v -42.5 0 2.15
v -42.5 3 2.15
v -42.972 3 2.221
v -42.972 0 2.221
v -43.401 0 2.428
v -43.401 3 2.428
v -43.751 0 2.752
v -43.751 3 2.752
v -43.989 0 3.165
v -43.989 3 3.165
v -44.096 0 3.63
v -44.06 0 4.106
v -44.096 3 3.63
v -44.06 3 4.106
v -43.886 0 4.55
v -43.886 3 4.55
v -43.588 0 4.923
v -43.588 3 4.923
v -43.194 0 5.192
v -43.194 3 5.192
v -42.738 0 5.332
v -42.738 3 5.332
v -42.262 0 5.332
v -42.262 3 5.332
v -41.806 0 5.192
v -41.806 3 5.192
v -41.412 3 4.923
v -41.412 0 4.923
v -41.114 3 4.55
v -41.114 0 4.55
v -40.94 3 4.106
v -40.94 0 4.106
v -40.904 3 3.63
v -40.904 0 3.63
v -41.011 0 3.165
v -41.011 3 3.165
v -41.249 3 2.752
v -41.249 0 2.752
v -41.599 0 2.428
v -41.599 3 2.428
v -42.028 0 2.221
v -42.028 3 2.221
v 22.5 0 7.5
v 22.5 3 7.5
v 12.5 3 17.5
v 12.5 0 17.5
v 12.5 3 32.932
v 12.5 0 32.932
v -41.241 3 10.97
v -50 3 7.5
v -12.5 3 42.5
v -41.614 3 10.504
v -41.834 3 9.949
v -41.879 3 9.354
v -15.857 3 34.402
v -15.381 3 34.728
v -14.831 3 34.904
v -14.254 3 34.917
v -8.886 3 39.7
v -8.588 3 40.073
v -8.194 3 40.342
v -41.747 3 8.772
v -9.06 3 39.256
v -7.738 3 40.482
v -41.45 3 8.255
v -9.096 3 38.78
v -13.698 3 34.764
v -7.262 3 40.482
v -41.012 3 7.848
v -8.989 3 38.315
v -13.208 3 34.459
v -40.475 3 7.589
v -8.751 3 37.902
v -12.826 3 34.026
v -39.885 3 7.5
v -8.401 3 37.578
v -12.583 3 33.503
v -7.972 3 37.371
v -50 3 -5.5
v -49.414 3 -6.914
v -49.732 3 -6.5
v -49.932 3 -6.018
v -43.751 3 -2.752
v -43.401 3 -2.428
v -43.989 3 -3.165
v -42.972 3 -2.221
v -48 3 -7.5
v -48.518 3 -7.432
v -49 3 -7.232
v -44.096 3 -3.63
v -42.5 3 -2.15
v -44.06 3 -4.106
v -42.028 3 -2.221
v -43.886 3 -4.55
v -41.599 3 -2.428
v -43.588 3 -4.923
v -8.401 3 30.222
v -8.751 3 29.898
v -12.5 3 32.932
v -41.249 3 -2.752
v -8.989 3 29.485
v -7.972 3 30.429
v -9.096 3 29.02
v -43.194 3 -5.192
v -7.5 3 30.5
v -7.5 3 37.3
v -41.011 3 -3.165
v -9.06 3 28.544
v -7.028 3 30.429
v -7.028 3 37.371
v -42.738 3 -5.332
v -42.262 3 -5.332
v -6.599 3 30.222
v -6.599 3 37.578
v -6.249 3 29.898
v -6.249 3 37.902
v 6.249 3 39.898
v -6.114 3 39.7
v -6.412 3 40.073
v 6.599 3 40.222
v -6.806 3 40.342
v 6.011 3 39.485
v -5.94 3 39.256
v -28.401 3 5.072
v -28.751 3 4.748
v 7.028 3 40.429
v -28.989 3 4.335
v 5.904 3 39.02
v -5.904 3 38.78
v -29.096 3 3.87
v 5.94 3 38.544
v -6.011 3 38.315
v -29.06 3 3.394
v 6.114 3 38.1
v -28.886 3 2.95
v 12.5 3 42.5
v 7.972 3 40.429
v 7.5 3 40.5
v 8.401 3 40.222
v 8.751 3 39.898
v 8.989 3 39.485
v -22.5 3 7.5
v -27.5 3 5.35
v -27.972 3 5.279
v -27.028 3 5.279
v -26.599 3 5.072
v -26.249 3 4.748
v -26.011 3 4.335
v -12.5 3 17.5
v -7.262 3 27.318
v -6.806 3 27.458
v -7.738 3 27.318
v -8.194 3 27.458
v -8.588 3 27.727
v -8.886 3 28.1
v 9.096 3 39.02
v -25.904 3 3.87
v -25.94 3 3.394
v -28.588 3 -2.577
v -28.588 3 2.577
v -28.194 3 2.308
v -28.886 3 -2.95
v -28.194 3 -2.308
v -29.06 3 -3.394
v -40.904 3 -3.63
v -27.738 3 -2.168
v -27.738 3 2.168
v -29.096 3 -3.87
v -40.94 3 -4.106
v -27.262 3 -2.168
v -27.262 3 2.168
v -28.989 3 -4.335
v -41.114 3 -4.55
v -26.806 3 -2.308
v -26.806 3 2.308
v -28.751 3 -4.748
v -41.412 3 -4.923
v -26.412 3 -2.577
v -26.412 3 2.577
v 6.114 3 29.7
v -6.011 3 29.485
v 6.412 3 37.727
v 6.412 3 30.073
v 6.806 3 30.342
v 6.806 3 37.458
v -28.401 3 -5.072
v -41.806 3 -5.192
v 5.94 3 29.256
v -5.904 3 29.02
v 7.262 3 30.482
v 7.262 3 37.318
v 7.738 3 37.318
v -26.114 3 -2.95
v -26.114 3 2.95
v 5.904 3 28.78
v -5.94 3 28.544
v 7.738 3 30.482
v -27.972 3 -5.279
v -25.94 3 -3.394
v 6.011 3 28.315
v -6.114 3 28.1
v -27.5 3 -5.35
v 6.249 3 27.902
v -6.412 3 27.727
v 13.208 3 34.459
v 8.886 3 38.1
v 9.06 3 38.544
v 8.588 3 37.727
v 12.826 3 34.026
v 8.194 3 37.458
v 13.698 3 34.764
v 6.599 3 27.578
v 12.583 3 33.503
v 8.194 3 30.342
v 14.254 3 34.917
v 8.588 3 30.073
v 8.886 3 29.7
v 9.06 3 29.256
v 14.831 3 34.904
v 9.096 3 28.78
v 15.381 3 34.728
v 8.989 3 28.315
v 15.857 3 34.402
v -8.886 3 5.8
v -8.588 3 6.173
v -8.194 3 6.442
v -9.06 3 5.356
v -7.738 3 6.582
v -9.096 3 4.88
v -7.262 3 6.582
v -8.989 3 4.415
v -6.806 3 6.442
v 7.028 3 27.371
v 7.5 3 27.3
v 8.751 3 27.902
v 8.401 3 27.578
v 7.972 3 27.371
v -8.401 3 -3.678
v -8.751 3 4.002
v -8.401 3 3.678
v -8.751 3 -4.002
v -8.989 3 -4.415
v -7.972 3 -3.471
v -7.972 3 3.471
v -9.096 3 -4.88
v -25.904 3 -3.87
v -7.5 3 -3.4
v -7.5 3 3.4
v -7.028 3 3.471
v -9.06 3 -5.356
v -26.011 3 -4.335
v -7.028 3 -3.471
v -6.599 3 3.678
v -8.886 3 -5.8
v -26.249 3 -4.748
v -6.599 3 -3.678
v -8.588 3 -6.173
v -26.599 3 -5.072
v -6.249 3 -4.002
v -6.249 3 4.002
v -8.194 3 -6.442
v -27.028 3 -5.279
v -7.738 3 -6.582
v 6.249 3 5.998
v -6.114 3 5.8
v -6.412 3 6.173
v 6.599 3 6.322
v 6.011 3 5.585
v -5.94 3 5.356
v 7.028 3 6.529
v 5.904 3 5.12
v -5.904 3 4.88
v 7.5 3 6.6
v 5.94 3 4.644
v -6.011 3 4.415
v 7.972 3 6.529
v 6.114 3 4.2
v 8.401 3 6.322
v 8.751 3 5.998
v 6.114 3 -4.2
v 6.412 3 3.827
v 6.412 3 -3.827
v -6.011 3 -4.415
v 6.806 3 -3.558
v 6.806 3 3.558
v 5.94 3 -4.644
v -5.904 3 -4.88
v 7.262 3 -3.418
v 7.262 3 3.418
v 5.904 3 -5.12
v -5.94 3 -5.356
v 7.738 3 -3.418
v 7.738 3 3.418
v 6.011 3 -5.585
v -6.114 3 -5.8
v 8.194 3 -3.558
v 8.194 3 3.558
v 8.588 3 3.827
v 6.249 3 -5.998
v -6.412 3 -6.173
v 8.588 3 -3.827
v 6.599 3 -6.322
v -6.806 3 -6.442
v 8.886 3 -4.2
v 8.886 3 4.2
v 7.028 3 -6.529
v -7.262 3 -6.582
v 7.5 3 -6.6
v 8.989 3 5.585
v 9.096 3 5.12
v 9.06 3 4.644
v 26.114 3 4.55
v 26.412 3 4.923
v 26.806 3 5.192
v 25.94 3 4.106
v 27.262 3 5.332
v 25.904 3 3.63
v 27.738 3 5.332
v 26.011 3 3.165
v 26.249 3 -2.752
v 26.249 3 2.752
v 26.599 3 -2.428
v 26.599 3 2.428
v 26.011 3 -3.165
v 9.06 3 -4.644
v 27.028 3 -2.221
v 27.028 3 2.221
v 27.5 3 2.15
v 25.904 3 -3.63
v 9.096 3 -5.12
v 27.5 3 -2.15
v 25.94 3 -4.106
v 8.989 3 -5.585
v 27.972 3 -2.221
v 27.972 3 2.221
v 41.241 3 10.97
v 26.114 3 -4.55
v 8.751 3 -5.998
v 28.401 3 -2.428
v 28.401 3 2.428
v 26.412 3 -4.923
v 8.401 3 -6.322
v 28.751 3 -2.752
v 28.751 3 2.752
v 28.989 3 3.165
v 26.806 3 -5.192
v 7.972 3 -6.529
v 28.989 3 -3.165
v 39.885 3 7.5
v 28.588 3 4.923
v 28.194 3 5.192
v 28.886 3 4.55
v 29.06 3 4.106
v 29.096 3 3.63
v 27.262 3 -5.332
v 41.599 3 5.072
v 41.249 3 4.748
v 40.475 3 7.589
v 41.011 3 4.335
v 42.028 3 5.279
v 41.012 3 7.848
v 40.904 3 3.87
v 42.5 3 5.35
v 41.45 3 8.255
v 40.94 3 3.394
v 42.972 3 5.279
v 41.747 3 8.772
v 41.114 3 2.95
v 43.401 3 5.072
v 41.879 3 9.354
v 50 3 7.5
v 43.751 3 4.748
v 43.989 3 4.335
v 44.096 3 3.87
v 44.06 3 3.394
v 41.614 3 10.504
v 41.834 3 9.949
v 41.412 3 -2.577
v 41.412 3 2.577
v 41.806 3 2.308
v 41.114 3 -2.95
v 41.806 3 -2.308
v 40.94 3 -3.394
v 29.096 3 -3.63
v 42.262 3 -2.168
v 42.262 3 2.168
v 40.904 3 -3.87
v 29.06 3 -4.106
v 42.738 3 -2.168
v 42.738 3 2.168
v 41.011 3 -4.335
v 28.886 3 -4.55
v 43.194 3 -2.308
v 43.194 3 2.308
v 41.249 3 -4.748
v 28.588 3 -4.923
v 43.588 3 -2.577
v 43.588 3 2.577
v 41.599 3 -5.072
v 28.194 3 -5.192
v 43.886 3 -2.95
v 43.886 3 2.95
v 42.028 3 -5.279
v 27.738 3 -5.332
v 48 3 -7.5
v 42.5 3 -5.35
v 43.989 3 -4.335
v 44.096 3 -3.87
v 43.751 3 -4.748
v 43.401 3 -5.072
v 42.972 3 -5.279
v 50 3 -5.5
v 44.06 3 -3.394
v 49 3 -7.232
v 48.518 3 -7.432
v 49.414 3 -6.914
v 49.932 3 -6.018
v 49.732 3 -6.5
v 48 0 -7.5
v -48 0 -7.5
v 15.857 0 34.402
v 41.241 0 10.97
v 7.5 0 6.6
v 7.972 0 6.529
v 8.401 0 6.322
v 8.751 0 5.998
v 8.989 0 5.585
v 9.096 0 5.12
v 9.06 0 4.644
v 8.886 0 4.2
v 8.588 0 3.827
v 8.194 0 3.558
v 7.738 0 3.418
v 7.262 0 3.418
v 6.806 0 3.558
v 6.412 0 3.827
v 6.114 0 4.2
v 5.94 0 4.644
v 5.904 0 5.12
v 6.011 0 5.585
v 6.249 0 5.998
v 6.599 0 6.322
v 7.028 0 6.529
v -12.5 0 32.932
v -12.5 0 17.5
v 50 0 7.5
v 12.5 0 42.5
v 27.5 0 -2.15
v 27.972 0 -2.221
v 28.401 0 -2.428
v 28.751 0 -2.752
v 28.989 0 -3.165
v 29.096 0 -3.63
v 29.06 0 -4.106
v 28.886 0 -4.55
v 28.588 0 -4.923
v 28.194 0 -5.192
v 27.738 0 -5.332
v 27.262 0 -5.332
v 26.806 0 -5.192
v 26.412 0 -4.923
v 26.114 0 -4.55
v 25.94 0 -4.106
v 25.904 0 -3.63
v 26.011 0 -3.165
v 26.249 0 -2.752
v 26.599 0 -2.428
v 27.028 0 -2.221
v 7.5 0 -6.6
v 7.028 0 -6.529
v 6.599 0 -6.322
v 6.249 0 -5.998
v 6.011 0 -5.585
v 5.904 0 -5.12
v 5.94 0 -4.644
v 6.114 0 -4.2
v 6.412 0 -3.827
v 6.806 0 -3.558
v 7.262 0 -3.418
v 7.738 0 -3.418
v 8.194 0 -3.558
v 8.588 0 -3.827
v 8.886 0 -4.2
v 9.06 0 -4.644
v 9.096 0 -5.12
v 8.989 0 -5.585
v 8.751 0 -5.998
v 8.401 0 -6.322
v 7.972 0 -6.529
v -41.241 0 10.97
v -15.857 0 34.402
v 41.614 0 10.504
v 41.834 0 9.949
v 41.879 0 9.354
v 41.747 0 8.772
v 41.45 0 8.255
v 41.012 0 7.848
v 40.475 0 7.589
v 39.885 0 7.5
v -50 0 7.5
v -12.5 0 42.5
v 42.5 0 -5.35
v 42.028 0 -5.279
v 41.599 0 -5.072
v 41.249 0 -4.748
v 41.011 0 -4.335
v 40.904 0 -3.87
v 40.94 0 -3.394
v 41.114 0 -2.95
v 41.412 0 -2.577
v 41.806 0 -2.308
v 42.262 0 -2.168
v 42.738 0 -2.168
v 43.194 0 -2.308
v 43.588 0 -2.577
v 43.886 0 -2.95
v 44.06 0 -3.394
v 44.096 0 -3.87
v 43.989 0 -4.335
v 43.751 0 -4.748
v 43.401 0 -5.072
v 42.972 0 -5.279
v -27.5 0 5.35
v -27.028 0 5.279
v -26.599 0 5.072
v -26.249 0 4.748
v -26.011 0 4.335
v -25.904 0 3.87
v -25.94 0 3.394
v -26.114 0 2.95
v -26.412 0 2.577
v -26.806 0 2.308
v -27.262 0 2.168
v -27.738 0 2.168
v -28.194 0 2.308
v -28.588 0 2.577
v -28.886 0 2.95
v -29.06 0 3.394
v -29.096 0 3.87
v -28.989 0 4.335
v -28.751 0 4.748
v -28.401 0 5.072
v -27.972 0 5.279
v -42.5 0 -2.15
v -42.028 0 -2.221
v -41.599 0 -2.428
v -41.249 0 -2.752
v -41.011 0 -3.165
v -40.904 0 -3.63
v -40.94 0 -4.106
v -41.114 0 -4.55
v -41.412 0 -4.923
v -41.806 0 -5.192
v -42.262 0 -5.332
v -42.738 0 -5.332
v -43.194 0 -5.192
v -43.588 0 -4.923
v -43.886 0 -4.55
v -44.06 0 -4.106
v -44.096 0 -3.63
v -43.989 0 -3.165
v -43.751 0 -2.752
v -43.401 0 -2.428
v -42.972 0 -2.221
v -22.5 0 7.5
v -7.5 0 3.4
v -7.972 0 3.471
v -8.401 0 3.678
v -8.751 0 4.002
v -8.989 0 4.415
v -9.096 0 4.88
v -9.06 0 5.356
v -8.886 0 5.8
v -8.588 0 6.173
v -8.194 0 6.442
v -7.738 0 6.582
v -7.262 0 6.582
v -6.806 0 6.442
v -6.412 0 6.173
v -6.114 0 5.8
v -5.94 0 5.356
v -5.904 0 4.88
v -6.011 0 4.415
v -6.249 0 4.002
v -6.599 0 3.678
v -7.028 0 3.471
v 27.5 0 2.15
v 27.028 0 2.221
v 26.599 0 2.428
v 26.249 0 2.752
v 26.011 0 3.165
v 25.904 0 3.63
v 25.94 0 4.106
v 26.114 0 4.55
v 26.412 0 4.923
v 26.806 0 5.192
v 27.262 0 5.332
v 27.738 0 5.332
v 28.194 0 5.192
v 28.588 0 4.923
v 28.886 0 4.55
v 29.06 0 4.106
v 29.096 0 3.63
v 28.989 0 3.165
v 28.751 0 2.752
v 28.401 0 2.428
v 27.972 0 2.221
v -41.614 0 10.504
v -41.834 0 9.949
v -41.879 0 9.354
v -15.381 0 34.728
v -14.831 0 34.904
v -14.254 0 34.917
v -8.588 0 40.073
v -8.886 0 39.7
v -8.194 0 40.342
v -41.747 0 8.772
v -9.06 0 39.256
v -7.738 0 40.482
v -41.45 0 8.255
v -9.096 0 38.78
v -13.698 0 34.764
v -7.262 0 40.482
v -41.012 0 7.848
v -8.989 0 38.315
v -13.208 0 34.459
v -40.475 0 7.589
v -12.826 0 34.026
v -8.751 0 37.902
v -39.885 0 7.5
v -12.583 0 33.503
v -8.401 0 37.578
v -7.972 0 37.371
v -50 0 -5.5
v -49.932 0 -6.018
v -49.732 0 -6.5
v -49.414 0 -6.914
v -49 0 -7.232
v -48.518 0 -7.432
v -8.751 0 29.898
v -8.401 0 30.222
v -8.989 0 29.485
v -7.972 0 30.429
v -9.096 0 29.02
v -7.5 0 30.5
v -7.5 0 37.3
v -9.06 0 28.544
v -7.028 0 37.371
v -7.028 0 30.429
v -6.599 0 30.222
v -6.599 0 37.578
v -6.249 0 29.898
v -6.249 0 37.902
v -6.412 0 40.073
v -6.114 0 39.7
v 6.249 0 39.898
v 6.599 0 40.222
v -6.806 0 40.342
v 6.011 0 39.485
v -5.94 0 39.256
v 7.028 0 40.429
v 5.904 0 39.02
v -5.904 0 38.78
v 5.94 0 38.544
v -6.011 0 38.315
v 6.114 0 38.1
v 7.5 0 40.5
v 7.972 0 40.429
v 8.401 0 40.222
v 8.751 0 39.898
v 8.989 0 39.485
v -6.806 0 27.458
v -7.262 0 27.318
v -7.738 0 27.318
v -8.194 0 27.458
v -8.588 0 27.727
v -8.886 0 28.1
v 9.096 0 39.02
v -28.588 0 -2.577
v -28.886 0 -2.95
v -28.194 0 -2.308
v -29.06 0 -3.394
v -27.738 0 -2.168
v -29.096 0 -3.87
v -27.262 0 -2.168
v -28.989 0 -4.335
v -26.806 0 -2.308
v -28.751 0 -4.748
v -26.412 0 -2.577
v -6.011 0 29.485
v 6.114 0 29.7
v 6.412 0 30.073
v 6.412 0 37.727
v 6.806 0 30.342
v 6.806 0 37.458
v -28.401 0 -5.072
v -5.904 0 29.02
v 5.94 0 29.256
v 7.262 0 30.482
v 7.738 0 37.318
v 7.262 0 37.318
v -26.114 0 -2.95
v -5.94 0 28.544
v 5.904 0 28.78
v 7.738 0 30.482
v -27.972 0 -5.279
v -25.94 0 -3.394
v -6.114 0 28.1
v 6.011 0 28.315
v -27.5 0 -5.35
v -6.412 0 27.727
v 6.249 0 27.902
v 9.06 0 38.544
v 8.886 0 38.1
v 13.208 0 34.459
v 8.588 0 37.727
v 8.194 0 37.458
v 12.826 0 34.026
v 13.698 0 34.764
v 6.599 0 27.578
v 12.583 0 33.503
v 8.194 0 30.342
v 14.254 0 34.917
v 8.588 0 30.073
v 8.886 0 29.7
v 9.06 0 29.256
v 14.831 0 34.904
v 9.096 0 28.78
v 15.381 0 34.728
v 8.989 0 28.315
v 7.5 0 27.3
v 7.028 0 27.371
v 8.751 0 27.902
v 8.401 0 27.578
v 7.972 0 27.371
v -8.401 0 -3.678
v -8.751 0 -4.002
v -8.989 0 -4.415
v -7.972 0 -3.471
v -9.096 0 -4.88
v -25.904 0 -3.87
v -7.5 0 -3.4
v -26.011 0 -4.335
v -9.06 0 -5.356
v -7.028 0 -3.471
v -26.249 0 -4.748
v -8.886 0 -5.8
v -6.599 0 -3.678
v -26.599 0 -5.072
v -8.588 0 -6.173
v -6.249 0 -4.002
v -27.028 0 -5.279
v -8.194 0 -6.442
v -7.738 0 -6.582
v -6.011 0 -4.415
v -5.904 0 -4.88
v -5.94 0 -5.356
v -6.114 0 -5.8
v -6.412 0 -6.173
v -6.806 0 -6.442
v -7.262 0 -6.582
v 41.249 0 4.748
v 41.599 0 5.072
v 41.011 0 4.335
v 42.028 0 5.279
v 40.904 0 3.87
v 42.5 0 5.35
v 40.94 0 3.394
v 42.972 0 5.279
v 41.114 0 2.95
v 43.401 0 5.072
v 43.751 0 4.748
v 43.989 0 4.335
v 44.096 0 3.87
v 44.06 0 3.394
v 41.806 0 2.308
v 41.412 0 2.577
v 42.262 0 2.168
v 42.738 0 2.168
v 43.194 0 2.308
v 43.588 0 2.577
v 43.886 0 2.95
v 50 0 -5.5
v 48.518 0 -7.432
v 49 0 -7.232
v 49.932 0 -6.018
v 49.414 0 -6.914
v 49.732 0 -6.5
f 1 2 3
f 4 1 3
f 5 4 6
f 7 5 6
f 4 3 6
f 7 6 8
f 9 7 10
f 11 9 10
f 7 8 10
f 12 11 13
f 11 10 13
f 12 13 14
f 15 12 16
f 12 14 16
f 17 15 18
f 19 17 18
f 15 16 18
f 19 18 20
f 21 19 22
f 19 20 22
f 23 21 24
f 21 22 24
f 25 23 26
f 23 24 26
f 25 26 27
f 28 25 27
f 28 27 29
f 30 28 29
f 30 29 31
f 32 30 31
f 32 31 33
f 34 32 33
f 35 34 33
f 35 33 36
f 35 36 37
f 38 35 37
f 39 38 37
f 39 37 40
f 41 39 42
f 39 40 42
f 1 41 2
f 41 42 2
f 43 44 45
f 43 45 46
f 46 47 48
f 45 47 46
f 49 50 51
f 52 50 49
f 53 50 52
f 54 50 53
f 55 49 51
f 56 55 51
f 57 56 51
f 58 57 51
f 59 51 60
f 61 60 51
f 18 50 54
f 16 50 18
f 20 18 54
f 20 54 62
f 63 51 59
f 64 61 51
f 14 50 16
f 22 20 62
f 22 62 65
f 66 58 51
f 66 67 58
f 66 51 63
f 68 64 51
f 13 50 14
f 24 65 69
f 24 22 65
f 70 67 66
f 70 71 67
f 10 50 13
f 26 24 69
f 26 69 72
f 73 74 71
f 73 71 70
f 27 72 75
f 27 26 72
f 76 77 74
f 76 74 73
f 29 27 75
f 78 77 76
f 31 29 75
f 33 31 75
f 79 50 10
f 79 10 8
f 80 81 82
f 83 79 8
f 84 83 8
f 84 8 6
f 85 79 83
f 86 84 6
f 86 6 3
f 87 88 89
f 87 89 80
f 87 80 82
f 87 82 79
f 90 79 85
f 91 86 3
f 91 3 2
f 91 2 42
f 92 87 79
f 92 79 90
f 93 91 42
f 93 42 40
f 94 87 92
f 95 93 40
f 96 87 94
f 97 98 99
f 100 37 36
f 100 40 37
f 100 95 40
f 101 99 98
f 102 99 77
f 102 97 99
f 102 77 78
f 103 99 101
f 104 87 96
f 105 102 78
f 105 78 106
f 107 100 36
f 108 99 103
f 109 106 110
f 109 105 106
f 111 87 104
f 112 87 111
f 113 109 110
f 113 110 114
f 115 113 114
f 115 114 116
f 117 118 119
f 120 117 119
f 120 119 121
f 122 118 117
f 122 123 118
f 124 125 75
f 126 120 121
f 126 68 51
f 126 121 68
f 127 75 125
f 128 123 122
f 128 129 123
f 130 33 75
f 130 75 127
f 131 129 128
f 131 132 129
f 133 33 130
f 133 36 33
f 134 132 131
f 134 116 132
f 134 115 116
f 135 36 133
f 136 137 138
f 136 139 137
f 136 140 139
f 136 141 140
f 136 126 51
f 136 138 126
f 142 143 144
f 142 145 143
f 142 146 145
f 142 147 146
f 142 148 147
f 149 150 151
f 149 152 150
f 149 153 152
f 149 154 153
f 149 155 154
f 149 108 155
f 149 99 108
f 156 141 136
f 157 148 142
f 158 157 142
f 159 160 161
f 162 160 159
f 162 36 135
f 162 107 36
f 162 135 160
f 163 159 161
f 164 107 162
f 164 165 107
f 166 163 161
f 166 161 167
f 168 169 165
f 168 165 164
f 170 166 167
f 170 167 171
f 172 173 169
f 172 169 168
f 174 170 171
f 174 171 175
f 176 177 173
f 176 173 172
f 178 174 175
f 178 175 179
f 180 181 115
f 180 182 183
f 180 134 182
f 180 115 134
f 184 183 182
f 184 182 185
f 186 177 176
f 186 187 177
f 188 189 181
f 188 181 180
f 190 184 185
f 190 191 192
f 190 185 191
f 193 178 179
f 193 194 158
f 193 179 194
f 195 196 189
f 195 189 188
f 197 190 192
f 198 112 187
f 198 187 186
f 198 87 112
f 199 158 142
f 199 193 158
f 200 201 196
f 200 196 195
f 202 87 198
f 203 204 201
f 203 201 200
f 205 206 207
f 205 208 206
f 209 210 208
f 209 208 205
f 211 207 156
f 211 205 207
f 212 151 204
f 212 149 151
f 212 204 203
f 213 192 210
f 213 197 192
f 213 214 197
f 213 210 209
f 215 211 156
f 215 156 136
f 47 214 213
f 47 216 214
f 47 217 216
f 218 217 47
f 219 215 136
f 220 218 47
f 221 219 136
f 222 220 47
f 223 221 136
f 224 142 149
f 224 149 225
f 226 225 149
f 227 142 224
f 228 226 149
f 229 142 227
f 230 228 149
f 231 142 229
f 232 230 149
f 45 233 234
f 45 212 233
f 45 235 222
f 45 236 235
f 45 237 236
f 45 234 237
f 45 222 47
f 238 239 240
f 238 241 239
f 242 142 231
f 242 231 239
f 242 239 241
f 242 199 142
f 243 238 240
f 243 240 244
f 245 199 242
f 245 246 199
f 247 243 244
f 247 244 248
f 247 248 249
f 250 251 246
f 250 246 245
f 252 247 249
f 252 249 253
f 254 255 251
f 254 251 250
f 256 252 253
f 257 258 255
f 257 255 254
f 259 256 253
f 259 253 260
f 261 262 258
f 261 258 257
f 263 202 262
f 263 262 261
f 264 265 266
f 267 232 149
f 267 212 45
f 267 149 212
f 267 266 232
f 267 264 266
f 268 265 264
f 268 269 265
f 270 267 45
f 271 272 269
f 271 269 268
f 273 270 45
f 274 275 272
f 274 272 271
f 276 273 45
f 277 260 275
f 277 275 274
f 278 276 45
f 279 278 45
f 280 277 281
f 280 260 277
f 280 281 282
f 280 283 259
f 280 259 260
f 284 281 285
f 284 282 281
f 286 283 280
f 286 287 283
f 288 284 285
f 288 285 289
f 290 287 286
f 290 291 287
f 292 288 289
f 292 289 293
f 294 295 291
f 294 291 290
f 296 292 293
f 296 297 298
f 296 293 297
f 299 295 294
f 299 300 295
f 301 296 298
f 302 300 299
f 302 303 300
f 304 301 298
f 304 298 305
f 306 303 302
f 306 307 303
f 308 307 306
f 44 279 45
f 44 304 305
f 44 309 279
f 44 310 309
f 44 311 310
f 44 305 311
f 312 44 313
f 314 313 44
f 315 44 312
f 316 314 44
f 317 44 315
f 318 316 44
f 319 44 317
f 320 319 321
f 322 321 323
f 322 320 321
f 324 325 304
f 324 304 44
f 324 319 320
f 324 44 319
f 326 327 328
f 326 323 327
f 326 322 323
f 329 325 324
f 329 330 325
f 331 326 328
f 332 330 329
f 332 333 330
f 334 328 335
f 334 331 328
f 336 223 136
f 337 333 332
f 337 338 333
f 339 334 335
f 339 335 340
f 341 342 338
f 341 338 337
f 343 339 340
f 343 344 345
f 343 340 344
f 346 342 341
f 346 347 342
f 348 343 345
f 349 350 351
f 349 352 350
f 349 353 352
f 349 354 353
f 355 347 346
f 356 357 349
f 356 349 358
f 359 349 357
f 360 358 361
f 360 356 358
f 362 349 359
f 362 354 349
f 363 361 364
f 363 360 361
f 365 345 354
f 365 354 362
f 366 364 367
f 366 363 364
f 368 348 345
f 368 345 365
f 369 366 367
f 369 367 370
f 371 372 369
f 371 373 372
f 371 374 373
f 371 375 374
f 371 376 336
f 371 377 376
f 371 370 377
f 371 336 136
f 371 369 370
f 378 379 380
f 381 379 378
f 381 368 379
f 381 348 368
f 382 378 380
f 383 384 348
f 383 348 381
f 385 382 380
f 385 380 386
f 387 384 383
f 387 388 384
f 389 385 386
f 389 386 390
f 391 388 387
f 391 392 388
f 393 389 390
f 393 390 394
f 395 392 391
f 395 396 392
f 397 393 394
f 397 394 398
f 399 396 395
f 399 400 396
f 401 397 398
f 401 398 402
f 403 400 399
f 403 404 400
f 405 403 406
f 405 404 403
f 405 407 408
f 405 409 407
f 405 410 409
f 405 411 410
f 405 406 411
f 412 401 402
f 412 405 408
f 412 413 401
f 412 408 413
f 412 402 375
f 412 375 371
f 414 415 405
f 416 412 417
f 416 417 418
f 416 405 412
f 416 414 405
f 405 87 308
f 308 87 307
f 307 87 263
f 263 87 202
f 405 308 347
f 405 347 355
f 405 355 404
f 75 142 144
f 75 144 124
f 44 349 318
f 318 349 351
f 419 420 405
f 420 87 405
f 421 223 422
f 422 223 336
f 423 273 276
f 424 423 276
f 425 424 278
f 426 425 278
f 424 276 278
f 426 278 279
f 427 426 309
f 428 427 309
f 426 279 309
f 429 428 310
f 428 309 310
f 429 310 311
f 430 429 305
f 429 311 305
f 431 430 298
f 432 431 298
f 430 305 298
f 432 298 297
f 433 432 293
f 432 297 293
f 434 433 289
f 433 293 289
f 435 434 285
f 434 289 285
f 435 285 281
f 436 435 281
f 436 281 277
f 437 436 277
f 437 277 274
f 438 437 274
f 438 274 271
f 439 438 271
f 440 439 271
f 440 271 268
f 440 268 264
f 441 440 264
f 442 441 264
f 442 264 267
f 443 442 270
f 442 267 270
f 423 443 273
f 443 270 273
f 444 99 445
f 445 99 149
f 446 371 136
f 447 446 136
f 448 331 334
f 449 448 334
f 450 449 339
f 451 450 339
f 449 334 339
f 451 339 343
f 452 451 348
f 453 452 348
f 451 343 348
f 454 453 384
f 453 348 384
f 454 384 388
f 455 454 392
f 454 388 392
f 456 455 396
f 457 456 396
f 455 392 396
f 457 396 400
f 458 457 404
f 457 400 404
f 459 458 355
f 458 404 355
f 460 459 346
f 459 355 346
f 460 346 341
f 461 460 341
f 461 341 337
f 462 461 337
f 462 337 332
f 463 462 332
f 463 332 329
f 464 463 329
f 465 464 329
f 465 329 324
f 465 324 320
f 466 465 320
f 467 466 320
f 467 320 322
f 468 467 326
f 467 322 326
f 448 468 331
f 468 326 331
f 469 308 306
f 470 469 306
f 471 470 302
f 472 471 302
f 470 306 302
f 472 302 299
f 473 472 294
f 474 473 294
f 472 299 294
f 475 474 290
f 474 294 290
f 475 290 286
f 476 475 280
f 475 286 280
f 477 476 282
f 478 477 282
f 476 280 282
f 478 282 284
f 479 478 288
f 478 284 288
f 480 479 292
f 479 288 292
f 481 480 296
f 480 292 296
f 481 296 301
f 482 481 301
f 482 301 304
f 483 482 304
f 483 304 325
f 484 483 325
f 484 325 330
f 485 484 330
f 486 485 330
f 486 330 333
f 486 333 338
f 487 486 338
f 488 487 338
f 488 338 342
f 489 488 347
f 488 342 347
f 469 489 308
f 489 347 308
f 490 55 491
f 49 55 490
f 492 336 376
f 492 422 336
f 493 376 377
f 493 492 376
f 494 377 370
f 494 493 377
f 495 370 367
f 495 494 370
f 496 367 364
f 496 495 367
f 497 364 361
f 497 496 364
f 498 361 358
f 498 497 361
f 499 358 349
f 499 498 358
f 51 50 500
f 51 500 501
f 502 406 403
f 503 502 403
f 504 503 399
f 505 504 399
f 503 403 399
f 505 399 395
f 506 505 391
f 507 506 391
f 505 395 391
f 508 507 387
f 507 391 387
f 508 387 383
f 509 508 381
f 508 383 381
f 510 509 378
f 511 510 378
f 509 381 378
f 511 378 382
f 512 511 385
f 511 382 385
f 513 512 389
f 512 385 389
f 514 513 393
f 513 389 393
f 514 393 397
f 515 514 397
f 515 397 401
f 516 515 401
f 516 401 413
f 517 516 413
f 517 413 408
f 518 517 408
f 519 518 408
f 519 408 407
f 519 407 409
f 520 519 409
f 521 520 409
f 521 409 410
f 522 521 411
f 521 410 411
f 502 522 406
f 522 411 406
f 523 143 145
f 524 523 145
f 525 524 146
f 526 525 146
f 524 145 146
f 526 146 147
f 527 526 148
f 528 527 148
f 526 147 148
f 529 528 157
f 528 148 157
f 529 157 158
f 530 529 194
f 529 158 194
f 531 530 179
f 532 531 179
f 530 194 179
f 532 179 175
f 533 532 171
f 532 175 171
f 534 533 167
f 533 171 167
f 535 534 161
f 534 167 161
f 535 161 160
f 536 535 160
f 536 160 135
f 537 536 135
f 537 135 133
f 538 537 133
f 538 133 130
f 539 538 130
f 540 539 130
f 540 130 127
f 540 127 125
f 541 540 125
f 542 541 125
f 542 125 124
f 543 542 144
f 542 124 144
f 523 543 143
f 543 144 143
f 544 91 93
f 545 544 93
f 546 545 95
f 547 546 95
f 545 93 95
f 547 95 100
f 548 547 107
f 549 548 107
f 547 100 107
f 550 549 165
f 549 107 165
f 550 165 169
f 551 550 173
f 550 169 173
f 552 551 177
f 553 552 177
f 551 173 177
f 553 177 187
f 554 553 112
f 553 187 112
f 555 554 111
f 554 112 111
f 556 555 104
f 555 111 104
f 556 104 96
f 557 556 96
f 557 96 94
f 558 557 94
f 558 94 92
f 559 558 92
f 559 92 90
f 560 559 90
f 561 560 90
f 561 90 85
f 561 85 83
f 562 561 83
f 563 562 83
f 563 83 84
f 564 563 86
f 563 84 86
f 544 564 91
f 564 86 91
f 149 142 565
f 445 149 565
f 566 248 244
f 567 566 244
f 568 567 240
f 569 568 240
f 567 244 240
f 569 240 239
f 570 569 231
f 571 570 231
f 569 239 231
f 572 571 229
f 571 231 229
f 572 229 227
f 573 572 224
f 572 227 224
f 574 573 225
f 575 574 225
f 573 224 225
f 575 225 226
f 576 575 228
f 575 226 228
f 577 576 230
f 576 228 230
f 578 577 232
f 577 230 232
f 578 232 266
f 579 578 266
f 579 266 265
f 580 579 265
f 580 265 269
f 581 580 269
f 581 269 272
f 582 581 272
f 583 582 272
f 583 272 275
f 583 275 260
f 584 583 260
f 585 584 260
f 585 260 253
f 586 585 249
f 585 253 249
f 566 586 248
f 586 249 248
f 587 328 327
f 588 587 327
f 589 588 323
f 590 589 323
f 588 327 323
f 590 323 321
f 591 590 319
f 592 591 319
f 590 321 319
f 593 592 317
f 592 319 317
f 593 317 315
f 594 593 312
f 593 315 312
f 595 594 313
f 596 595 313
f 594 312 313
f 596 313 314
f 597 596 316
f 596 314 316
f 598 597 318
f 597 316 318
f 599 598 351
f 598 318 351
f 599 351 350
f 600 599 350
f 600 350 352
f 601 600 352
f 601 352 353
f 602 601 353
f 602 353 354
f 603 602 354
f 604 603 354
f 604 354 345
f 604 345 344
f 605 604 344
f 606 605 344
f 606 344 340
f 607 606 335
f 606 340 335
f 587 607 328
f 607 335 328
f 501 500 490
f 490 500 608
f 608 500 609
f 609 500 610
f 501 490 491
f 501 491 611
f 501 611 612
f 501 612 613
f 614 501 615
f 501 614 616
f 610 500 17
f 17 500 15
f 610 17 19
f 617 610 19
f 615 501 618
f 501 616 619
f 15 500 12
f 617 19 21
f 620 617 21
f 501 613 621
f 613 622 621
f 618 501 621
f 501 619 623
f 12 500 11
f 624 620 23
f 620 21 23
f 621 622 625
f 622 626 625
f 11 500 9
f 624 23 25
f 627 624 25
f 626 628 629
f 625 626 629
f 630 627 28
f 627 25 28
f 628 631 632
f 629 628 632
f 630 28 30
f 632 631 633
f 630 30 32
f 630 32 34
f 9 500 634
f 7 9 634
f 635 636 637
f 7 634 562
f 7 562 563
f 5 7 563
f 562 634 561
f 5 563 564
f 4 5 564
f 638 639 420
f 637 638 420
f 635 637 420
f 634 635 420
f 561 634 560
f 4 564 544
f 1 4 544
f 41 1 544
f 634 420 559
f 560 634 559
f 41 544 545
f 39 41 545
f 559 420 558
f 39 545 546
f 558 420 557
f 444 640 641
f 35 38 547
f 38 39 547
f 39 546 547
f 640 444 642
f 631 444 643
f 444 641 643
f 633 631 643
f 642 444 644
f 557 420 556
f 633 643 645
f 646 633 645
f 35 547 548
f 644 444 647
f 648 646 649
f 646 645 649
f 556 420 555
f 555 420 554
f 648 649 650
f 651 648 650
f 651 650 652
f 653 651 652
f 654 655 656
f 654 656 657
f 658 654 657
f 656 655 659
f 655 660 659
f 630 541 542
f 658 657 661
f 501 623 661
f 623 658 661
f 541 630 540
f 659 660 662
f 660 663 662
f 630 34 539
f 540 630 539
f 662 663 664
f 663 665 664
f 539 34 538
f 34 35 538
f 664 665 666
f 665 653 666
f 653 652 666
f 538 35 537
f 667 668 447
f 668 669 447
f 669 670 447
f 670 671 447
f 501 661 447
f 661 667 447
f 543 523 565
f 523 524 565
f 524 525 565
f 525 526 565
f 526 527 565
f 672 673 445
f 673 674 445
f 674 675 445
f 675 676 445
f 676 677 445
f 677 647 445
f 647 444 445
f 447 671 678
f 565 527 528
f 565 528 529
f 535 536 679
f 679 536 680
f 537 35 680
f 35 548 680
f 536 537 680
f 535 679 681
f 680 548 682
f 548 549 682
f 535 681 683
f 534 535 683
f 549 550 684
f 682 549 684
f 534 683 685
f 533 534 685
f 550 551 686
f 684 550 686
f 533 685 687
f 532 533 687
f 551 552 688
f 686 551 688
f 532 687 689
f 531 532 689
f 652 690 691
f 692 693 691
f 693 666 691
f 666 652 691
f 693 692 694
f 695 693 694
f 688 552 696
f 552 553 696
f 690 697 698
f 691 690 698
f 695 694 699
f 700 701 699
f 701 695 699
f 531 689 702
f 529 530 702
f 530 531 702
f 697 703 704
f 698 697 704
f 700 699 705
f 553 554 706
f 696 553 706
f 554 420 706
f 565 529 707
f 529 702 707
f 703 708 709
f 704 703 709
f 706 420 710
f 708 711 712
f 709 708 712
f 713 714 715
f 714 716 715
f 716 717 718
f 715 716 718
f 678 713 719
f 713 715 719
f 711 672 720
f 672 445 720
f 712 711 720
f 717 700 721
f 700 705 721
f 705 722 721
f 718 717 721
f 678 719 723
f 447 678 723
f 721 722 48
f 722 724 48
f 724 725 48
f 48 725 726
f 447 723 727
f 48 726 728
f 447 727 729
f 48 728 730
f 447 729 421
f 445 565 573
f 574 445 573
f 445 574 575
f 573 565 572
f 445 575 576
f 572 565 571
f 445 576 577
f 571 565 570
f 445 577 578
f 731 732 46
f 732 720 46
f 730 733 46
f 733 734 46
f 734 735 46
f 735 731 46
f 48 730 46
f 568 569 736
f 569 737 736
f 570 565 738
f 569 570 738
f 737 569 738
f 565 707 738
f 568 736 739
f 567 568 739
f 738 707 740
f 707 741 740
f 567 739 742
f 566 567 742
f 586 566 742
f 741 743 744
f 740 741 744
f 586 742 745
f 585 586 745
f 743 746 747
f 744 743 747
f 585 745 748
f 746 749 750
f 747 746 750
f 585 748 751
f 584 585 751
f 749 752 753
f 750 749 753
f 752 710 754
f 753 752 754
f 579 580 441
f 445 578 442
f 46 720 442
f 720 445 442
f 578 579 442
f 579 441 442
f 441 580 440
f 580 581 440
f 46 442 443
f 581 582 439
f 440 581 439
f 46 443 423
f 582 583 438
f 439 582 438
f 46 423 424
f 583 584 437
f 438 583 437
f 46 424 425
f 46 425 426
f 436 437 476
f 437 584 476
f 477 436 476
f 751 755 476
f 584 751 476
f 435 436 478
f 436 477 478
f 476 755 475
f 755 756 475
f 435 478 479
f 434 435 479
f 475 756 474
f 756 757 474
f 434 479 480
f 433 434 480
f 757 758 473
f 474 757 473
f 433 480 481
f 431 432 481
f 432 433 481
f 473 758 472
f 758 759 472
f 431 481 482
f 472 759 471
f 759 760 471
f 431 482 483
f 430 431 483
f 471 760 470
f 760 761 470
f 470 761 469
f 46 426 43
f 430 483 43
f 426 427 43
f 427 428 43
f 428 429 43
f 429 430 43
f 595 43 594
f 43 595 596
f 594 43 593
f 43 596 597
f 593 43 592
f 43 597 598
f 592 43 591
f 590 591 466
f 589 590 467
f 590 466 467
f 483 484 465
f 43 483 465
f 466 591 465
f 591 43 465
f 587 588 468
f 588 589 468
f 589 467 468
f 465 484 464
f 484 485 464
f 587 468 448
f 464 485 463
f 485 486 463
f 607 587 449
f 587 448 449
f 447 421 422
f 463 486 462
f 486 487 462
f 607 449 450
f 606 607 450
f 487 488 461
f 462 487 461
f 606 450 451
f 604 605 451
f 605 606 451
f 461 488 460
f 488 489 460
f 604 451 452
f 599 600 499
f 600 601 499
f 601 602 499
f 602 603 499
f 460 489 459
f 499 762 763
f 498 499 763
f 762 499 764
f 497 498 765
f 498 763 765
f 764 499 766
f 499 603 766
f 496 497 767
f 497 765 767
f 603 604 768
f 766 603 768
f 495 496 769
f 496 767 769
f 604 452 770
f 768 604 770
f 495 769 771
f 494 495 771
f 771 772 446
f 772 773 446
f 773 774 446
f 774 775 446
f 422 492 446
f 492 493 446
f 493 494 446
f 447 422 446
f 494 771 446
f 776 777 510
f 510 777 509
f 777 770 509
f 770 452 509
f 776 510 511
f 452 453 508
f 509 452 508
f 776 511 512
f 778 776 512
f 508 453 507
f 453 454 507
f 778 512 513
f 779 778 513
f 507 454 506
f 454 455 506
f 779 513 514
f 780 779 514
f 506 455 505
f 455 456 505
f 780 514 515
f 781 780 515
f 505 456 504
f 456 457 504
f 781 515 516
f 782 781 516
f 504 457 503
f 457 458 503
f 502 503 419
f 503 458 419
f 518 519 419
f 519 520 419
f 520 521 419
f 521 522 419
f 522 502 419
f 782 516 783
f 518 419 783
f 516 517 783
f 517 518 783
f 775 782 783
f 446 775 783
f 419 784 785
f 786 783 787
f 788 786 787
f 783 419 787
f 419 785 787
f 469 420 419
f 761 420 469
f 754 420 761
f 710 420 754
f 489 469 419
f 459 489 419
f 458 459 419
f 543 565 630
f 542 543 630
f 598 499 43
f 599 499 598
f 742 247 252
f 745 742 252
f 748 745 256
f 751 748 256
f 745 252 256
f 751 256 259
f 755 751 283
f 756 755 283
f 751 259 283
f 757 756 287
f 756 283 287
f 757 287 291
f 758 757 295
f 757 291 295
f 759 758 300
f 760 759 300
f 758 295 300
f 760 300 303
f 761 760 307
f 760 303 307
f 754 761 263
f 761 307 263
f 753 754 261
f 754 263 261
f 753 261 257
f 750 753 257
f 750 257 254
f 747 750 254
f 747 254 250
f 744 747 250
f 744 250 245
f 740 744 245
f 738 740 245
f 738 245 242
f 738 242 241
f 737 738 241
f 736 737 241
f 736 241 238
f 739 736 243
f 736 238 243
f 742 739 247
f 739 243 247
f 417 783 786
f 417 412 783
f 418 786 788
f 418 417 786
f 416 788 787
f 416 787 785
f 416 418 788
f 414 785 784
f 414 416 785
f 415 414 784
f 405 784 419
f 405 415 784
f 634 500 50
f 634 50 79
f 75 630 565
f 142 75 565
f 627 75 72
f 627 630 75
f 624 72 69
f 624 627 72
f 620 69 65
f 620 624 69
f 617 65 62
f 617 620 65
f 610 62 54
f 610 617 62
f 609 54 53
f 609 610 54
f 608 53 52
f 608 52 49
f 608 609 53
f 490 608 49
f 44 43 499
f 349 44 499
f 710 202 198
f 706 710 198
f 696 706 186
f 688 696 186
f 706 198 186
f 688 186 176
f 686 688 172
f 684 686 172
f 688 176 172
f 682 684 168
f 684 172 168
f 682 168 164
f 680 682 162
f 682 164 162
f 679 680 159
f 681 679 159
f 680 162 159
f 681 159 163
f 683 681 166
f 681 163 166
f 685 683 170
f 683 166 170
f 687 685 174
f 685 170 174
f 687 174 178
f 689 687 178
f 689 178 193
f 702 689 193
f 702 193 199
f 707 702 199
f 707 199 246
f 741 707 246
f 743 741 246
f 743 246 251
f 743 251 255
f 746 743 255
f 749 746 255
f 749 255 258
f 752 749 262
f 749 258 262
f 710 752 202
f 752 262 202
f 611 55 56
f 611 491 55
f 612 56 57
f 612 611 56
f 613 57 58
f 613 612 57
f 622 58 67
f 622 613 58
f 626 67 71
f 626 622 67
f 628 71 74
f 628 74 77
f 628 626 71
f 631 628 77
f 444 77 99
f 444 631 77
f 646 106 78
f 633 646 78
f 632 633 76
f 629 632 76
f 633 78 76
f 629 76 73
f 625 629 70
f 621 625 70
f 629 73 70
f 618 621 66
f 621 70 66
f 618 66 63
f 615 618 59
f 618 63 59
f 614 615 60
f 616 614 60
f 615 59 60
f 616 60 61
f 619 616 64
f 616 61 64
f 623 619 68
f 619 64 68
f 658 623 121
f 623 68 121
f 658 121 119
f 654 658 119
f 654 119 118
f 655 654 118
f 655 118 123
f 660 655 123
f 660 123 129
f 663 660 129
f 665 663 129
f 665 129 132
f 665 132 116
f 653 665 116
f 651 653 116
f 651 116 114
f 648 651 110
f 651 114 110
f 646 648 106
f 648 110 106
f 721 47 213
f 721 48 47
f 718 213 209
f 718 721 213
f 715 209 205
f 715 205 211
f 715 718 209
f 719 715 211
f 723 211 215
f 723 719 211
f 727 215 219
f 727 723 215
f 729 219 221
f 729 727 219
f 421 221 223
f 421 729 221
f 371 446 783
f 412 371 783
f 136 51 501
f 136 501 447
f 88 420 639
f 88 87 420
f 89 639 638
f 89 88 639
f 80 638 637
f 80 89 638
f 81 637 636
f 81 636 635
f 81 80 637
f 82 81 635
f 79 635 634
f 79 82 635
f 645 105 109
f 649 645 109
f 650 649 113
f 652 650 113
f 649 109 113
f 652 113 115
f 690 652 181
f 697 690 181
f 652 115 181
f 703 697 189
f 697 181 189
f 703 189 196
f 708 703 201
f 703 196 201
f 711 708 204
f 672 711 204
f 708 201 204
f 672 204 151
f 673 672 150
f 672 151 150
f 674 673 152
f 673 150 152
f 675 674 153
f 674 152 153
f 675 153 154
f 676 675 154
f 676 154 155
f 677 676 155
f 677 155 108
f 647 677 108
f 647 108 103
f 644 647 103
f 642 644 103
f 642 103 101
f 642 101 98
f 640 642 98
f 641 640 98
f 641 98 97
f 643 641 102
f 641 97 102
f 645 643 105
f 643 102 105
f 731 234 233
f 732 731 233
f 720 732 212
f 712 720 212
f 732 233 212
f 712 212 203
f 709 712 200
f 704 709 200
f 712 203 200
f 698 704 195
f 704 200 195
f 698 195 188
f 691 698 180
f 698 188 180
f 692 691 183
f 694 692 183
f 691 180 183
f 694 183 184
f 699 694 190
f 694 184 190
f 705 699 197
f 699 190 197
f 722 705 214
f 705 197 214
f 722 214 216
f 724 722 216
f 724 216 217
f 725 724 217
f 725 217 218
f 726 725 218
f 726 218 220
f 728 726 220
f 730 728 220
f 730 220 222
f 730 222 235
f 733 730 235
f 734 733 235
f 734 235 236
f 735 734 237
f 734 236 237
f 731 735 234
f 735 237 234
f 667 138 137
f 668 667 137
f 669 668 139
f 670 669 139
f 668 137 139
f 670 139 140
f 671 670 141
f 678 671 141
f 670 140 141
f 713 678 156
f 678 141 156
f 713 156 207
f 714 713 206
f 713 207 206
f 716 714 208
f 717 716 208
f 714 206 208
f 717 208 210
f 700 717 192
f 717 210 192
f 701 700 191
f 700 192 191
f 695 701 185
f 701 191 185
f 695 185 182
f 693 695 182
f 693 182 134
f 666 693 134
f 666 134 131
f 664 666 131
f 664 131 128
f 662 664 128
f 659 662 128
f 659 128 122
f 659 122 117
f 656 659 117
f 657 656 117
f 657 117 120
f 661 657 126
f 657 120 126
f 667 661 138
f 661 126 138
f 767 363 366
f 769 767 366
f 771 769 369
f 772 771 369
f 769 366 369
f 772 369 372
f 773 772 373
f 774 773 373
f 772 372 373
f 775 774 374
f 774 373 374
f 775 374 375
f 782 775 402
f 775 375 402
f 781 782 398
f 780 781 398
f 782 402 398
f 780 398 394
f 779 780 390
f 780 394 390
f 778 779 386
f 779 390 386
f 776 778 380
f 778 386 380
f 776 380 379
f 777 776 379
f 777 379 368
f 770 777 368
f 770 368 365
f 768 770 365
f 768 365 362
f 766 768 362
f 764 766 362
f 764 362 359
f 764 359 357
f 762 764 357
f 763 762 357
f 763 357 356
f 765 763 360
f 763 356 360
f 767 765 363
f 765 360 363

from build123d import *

# Parameters (mm, degrees)
SKETCH_1_W          = 100
SKETCH_1_H          = 15
EXTRUDE_1_DEPTH     = 3
SKETCH_2_W          = 25
SKETCH_2_H          = 50
EXTRUDE_2_DEPTH     = 3
SKETCH_3_R          = 1.6
CUT_EXTRUDE_1_DEPTH = 3
EXTRUDE_3_DEPTH     = 3
CHAMFER_1_SIZE      = 10
FILLET_2_R          = 2


with BuildPart() as part:
    # 草图1 → 凸台-拉伸1 (new body)
    with BuildSketch(Plane(origin=(0, 0, 0), x_dir=(1, 0, 0), z_dir=(0, 1, 0))):
        Rectangle(SKETCH_1_W, SKETCH_1_H)
    extrude(amount=EXTRUDE_1_DEPTH)

    # 草图2 → 凸台-拉伸2 (add)
    with BuildSketch(Plane(origin=(0, 3, 0), x_dir=(1, 0, 0), z_dir=(0, 1, 0))):
        with Locations((0, -17.5)):
            Rectangle(SKETCH_2_W, SKETCH_2_H)
    extrude(amount=-EXTRUDE_2_DEPTH)

    # 草图3 → 切除-拉伸1 (cut)
    with BuildSketch(Plane(origin=(0, 3, 0), x_dir=(1, 0, 0), z_dir=(0, 1, 0))):
        with Locations(Location((-42.5, 3.75, 0), (0, 0, 270))):
            Circle(SKETCH_3_R)
        with Locations(Location((-42.5, -3.75, 0), (0, 0, 90))):
            Circle(SKETCH_3_R)
        with Locations(Location((-27.5, -3.75, 0), (0, 0, 270))):
            Circle(SKETCH_3_R)
        with Locations(Location((-27.5, 3.75, 0), (0, 0, 90))):
            Circle(SKETCH_3_R)
        with Locations(Location((27.5, -3.75, 0), (0, 0, 90))):
            Circle(SKETCH_3_R)
        with Locations(Location((42.5, -3.75, 0), (0, 0, 270))):
            Circle(SKETCH_3_R)
        with Locations(Location((42.5, 3.75, 0), (0, 0, 90))):
            Circle(SKETCH_3_R)
        with Locations(Location((27.5, 3.75, 0), (0, 0, 270))):
            Circle(SKETCH_3_R)
        with Locations(Location((-7.5, 5, 0), (0, 0, 270))):
            Circle(SKETCH_3_R)
        with Locations(Location((-7.5, -5, 0), (0, 0, 90))):
            Circle(SKETCH_3_R)
        with Locations(Location((7.5, -5, 0), (0, 0, 270))):
            Circle(SKETCH_3_R)
        with Locations(Location((7.5, 5, 0), (0, 0, 90))):
            Circle(SKETCH_3_R)
        with Locations(Location((-7.5, -28.9, 0), (0, 0, 270))):
            Circle(SKETCH_3_R)
        with Locations(Location((-7.5, -38.9, 0), (0, 0, 90))):
            Circle(SKETCH_3_R)
        with Locations(Location((7.5, -38.9, 0), (0, 0, 270))):
            Circle(SKETCH_3_R)
        with Locations(Location((7.5, -28.9, 0), (0, 0, 90))):
            Circle(SKETCH_3_R)
    extrude(amount=-CUT_EXTRUDE_1_DEPTH, mode=Mode.SUBTRACT)

    # 草图4 → 凸台-拉伸3 (add)
    with BuildSketch(Plane(origin=(0, 3, 0), x_dir=(1, 0, 0), z_dir=(0, 1, 0))):
        Polygon((-50, -7.5), (-12.5, -42.5), (-12.5, -37.5), (-45, -7.5), align=None)
        Polygon((12.5, -37.5), (45, -7.5), (50, -7.5), (12.5, -42.5), align=None)
    extrude(amount=-EXTRUDE_3_DEPTH)

    # 倒角1
    chamfer_1_edges = [part.edges().sort_by_distance(p)[0] for p in [
        (-12.5, 1.5, 7.5),
        (12.5, 1.5, 7.5),
    ]]
    chamfer(chamfer_1_edges, length=CHAMFER_1_SIZE)

    # 圆角2
    fillet_2_edges = [part.edges().sort_by_distance(p)[0] for p in [
        (-45, 1.5, 7.5),
        (-12.5, 1.5, 37.5),
        (12.5, 1.5, 37.5),
        (45, 1.5, 7.5),
        (-50, 1.5, -7.5),
        (50, 1.5, -7.5),
    ]]
    fillet(fillet_2_edges, radius=FILLET_2_R)


solid = part.part
